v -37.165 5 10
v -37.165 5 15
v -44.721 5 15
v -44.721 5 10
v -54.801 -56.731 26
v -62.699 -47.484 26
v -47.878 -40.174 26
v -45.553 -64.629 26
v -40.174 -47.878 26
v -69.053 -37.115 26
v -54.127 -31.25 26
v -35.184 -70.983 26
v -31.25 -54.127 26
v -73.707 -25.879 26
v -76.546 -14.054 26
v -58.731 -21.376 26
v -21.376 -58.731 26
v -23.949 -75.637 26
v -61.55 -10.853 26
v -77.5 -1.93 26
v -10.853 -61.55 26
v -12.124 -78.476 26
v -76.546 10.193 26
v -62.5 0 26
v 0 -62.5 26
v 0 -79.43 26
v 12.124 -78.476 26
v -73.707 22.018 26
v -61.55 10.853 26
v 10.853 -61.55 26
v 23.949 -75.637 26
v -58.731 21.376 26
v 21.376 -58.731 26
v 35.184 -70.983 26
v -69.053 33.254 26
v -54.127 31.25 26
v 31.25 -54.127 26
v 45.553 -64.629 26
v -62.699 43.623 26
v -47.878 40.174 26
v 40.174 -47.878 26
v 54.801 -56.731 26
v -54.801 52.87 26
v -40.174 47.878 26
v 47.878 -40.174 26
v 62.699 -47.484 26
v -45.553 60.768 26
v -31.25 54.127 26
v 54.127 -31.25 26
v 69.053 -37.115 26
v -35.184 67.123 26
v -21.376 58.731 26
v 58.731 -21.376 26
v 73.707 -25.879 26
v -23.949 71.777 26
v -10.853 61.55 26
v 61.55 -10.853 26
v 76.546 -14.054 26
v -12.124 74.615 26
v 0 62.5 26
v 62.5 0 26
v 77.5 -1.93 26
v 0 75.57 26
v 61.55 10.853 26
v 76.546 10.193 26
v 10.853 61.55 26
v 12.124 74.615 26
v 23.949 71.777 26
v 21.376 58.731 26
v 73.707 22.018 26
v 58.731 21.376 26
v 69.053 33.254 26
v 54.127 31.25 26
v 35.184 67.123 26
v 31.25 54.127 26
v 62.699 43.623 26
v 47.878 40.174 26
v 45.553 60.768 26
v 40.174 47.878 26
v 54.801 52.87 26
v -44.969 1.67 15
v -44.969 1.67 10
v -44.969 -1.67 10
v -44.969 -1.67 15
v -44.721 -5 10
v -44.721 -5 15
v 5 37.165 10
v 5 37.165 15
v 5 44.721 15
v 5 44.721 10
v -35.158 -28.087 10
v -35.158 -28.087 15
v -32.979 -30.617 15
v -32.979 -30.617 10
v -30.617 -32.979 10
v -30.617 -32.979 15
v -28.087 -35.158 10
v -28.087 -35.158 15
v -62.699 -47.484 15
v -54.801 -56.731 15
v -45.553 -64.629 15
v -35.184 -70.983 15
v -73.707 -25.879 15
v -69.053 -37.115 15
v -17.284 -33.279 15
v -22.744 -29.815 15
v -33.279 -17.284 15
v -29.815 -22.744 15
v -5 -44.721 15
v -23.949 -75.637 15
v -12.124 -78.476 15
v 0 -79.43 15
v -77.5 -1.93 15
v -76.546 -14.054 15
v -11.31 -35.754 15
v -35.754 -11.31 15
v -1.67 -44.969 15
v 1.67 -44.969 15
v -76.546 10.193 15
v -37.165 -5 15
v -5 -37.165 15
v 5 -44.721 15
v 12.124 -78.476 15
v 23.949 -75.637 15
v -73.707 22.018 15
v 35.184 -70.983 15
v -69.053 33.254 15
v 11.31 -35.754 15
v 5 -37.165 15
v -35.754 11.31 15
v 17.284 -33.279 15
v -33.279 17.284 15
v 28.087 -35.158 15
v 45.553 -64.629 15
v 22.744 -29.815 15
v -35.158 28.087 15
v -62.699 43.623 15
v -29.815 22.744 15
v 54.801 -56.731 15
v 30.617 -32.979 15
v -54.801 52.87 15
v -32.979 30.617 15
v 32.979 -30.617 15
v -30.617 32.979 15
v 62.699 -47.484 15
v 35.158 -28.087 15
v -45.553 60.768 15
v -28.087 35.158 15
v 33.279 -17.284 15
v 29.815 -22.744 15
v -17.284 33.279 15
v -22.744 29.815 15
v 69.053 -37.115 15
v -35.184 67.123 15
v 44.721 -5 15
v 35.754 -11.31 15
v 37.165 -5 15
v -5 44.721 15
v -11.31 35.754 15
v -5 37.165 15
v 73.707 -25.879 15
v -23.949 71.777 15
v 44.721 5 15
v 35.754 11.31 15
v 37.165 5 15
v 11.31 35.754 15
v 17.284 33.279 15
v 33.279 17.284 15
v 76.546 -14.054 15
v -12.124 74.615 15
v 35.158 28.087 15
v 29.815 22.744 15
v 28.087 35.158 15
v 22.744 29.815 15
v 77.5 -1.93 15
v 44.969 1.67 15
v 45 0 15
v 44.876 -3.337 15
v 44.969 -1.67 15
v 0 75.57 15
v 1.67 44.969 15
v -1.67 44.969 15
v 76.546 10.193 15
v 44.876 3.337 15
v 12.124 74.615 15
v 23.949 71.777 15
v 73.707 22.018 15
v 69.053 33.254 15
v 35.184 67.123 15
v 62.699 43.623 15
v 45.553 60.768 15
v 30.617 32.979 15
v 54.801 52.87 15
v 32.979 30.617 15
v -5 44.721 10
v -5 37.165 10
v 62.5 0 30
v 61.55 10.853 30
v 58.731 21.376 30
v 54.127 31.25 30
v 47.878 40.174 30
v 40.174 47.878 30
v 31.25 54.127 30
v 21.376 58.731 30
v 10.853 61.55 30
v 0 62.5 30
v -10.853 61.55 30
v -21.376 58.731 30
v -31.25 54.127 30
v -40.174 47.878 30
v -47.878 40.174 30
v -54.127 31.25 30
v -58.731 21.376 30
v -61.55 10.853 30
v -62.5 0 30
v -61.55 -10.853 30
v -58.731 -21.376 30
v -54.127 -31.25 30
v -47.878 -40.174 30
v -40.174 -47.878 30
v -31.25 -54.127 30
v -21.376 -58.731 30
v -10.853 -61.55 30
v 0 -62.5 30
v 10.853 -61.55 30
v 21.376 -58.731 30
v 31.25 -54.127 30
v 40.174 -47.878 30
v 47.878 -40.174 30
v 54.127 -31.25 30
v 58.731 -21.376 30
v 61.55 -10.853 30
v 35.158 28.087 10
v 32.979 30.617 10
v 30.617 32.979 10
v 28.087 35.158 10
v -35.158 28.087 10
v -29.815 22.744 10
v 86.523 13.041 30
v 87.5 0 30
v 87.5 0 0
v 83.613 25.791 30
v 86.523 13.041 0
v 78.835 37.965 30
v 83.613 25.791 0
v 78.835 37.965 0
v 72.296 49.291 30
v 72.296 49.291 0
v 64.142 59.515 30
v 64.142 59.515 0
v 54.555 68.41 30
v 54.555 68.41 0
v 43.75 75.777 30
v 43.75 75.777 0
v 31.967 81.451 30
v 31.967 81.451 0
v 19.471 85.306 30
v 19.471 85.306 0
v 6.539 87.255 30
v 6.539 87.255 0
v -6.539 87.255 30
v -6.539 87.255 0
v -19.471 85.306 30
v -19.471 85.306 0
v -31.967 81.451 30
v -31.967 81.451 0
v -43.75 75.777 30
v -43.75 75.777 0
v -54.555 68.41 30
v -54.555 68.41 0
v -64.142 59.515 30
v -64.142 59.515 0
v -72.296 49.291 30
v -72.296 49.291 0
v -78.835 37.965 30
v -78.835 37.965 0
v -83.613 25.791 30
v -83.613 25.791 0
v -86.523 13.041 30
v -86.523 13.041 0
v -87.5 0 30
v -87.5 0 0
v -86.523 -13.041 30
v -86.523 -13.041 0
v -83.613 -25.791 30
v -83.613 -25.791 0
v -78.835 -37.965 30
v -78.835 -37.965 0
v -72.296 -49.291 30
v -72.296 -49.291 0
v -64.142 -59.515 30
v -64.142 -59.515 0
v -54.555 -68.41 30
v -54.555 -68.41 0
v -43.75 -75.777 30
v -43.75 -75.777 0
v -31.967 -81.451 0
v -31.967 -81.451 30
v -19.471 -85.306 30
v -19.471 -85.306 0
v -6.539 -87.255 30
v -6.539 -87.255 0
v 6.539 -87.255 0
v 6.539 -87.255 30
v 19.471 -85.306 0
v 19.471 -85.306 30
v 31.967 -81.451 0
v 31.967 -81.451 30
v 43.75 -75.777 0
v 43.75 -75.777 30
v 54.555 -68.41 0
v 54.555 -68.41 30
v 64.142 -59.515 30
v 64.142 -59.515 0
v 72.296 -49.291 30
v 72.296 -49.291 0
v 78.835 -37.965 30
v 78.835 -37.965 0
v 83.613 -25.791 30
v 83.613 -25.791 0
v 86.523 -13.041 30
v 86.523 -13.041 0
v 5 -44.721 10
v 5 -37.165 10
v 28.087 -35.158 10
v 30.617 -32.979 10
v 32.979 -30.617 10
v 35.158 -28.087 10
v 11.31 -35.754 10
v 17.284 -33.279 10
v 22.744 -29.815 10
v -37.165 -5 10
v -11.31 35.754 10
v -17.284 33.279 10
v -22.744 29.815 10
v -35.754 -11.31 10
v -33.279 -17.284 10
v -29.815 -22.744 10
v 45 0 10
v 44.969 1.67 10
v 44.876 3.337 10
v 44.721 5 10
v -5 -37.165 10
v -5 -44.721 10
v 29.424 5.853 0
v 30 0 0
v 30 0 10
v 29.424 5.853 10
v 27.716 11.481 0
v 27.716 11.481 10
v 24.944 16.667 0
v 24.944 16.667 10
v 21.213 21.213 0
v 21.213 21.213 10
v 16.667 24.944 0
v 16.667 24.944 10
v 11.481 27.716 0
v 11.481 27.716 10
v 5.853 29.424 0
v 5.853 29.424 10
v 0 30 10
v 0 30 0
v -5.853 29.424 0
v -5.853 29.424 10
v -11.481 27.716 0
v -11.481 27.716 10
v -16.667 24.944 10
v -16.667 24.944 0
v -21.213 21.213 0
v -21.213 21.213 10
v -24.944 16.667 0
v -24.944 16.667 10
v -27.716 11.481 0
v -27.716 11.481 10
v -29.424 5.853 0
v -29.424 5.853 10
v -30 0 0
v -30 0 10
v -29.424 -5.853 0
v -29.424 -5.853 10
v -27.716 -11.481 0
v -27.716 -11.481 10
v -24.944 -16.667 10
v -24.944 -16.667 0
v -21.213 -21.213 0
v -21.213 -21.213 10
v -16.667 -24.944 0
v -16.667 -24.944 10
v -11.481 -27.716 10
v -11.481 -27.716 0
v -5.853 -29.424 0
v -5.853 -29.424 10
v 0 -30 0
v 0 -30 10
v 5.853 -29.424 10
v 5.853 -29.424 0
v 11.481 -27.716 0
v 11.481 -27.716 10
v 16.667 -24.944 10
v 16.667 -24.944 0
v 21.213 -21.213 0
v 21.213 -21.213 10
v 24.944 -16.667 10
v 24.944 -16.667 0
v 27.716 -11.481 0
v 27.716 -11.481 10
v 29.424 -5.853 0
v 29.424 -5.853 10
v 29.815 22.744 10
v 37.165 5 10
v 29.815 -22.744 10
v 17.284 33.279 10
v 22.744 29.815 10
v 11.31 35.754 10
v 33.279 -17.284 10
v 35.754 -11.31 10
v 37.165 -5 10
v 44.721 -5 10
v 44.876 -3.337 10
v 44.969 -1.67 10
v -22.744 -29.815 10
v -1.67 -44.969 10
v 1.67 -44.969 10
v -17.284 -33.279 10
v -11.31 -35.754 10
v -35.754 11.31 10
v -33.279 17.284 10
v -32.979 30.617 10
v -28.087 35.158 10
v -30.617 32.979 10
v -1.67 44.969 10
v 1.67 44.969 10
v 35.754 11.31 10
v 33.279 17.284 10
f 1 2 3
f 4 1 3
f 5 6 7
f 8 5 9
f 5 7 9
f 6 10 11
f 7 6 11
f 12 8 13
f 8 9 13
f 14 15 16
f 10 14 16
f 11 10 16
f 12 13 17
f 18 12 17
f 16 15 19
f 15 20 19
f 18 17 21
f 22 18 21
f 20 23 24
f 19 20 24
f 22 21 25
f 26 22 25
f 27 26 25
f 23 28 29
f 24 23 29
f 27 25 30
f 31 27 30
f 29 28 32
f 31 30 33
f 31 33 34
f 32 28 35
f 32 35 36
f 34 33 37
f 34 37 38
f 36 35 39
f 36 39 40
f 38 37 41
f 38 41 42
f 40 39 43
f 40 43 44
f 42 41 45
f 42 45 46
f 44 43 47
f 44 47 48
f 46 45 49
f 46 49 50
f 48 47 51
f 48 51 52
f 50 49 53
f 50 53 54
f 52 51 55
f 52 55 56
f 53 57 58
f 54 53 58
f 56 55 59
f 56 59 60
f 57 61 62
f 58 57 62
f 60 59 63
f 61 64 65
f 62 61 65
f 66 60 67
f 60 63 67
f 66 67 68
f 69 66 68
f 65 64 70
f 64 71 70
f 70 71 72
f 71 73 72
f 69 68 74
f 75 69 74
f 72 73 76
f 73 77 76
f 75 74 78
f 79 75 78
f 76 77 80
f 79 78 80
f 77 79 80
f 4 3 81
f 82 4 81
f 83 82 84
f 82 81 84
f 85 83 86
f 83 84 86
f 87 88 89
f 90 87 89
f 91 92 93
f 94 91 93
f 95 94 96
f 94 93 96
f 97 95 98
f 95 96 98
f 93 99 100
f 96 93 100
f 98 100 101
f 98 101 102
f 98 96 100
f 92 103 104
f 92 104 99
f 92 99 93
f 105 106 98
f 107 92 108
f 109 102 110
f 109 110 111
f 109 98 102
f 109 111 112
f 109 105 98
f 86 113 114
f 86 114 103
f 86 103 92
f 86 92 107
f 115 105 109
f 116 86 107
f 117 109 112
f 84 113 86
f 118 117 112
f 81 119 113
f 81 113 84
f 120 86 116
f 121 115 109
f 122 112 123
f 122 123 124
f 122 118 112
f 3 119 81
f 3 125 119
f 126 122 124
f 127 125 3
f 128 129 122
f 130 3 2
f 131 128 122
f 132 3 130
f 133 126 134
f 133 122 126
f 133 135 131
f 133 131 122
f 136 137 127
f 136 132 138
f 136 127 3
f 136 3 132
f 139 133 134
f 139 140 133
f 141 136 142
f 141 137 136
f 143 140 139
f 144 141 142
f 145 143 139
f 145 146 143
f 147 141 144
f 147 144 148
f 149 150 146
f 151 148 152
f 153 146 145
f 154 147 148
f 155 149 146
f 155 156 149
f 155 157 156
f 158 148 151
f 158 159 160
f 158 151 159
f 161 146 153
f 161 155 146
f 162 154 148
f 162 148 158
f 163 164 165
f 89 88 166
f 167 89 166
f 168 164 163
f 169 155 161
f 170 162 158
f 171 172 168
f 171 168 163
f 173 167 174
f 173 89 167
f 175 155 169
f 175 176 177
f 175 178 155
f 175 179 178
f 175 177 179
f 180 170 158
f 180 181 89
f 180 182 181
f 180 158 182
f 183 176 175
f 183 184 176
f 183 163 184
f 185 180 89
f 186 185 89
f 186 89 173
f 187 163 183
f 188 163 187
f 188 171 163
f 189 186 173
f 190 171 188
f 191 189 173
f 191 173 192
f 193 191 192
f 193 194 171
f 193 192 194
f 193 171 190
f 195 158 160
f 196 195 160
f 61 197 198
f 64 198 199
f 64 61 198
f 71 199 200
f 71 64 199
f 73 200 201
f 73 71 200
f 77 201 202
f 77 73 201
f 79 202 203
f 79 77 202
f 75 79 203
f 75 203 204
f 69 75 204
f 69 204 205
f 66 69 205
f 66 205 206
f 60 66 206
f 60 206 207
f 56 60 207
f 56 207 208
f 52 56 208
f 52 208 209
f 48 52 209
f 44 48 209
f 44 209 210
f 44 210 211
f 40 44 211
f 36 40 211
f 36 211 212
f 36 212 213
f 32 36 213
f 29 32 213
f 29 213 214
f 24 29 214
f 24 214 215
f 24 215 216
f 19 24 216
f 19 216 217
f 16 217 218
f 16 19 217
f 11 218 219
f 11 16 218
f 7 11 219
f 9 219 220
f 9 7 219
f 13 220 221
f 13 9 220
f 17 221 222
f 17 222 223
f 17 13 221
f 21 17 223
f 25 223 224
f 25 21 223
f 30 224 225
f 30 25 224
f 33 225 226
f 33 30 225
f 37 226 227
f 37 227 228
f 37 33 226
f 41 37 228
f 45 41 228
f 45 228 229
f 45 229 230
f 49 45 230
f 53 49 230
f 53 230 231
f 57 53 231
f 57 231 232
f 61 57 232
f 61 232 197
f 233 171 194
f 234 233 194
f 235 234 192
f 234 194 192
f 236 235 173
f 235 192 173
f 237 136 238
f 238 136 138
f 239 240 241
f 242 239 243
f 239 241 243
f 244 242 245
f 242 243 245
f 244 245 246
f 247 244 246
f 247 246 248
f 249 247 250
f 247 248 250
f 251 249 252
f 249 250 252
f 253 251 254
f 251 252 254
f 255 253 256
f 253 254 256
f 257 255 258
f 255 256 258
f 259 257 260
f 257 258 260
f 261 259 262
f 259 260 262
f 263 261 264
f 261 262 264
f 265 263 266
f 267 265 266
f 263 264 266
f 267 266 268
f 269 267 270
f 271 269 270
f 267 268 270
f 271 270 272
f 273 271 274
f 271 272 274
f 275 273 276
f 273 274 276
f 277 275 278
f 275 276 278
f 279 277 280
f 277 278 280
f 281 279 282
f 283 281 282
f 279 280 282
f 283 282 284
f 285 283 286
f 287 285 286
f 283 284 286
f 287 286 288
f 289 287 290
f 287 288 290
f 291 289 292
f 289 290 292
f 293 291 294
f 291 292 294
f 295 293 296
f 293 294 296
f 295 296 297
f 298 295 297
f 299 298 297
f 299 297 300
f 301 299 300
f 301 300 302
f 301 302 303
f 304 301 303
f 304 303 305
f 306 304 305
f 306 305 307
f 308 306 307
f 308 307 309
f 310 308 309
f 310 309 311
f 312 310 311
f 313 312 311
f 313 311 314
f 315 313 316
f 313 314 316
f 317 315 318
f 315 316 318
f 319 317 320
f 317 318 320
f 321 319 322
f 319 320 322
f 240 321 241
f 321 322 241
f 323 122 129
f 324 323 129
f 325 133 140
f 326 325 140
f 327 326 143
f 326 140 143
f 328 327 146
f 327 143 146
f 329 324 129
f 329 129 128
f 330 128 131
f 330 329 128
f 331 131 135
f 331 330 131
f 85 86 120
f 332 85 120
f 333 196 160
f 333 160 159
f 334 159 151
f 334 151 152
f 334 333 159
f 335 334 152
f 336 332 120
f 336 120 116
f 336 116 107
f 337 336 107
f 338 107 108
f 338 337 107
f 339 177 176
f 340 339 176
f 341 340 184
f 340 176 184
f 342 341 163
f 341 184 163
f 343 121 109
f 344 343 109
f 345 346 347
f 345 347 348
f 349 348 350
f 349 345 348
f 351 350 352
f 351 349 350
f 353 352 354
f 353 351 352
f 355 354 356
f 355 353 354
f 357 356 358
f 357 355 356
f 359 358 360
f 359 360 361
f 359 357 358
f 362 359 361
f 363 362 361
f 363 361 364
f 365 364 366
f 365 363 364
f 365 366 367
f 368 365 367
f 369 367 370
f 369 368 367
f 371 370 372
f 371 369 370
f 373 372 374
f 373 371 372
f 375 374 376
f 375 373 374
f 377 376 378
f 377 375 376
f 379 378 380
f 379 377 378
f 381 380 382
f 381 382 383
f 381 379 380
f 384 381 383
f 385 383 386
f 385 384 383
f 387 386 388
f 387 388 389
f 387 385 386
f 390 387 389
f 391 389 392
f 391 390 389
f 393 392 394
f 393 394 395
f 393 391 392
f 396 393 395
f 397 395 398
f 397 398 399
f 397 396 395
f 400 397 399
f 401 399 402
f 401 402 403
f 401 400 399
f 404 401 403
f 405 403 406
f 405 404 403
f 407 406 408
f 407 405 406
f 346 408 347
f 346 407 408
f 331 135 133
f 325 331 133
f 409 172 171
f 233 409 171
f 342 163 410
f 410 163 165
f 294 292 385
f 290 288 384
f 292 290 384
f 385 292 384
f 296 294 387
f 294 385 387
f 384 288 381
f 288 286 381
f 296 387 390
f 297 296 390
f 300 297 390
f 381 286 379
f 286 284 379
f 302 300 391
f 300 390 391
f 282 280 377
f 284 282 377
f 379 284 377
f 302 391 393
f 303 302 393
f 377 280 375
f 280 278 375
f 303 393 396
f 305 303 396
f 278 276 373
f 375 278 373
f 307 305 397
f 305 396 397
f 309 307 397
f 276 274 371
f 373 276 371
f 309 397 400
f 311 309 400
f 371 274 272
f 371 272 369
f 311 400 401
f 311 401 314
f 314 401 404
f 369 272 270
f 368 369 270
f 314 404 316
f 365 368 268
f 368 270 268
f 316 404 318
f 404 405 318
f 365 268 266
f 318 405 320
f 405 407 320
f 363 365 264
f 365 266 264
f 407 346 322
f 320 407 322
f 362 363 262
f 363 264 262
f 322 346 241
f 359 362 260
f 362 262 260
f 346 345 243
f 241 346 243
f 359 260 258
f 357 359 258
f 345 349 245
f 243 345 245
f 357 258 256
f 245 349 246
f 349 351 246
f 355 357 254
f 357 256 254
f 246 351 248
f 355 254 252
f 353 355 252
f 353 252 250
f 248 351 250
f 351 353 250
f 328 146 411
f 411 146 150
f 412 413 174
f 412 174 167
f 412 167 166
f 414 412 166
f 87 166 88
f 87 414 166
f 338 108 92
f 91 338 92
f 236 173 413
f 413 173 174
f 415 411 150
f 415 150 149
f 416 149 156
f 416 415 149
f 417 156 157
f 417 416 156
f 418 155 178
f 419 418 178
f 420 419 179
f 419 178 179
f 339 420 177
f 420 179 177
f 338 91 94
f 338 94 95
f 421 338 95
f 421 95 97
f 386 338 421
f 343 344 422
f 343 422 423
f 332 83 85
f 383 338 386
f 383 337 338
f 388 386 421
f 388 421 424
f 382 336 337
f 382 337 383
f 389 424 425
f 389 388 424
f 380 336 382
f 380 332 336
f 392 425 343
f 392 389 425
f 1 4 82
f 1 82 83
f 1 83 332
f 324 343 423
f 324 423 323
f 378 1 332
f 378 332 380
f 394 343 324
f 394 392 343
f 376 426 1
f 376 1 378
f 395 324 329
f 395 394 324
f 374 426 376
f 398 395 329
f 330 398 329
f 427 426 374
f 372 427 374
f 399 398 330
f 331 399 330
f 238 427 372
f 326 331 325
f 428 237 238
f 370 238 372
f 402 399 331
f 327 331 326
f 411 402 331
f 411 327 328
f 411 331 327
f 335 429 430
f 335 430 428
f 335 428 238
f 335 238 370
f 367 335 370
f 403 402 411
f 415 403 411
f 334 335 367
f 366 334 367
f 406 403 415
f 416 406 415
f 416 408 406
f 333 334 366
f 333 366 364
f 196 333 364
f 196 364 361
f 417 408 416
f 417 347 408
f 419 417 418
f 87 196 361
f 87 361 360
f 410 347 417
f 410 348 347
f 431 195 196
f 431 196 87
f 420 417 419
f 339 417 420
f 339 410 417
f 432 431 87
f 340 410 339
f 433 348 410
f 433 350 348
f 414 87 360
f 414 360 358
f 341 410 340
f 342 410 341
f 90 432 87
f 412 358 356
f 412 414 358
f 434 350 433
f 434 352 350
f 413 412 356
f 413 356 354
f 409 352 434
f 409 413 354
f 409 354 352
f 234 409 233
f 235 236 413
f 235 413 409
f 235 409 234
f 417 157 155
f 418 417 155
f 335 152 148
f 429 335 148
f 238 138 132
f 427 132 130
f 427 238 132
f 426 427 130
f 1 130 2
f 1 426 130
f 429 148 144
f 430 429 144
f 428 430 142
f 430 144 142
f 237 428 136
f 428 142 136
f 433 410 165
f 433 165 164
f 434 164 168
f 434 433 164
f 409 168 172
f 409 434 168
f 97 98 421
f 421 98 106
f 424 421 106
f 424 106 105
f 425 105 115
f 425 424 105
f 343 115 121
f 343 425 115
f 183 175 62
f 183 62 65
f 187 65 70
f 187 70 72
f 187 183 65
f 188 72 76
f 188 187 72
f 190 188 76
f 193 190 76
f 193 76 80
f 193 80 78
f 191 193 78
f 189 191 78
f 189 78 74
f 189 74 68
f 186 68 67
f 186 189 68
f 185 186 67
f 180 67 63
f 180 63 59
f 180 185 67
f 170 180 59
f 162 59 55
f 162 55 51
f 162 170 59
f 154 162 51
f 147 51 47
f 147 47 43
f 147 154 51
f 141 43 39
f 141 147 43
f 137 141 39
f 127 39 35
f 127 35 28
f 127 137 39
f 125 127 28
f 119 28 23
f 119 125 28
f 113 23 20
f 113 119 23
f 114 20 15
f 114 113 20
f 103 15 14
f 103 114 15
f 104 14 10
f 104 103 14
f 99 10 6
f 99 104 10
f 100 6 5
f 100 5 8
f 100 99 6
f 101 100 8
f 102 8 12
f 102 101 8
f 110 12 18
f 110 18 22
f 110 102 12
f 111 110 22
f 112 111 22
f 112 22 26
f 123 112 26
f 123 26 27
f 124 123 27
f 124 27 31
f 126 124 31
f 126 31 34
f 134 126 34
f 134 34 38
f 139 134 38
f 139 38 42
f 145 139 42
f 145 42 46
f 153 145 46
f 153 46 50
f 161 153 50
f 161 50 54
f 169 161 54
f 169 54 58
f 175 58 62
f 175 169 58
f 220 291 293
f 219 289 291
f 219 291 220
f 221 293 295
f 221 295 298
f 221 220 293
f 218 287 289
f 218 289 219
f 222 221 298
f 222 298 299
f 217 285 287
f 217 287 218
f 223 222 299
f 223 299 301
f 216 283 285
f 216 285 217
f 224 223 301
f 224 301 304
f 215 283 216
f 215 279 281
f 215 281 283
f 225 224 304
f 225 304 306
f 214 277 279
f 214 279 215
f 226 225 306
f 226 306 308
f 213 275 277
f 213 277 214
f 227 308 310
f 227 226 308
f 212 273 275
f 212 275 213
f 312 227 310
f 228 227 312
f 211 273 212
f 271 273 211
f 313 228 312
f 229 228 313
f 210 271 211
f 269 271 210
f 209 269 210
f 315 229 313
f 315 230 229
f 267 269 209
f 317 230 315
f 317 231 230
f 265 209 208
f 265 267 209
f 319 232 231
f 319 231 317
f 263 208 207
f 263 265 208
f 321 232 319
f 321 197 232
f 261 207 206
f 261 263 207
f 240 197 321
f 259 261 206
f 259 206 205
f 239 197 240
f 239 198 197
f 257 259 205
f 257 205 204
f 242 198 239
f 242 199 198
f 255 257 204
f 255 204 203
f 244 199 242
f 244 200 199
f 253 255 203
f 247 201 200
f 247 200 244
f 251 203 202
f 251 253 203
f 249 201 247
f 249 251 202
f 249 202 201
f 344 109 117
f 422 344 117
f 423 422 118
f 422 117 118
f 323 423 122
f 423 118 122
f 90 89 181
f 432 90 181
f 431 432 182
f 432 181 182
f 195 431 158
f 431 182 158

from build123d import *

# Parameters (mm, degrees)
F0_R     = 87.5
F0_R_2   = 30
F1_DEPTH = 10
F2_R     = 87.5
F2_R_2   = 37.5
F3_DEPTH = 5
F5_DEPTH = 5
F6_R     = 87.5
F6_R_2   = 62.5
F7_DEPTH = 15
F8_R     = 77.5
F9_DEPTH = 11


with BuildPart() as f1:
    # F0 (on Top) → F1 (new body)
    with BuildSketch(Plane.XY):
        Circle(F0_R)
        Circle(F0_R_2, mode=Mode.SUBTRACT)
    extrude(amount=F1_DEPTH)

    # F2 (on face) → F3 (join)
    with BuildSketch(Plane.XY.offset(10)):
        Circle(F2_R)
        Circle(F2_R_2, mode=Mode.SUBTRACT)
    extrude(amount=F3_DEPTH)

    # F4 (on face) → F5 (cut)
    with BuildSketch(Plane.XY.offset(15)):
        with BuildLine():
            ThreePointArc((-29.815278958, 22.7442111461), (-26.5165042945, 26.5165042945), (-22.7442111461, 29.815278958))
            Line((-22.7442111461, 29.815278958), (-28.0872426958, 35.1583105076))
            ThreePointArc((-28.0872426958, 35.1583105076), (-31.8198051534, 31.8198051534), (-35.1583105076, 28.0872426958))
            Line((-35.1583105076, 28.0872426958), (-29.815278958, 22.7442111461))
        make_face()
        with BuildLine():
            Line((-5, 44.72135955), (-5, 37.1651718683))
            ThreePointArc((-5, 37.1651718683), (0, 37.5), (5, 37.1651718683))
            Line((5, 37.1651718683), (5, 44.72135955))
            ThreePointArc((5, 44.72135955), (0, 45), (-5, 44.72135955))
        make_face()
        with BuildLine():
            Line((28.0872426958, 35.1583105076), (22.7442111461, 29.815278958))
            ThreePointArc((22.7442111461, 29.815278958), (26.5165042945, 26.5165042945), (29.815278958, 22.7442111461))
            Line((29.815278958, 22.7442111461), (35.1583105076, 28.0872426958))
            ThreePointArc((35.1583105076, 28.0872426958), (31.8198051534, 31.8198051534), (28.0872426958, 35.1583105076))
        make_face()
        with BuildLine():
            Line((44.72135955, 5), (37.1651718683, 5))
            ThreePointArc((37.1651718683, 5), (37.4161993331, 2.5055992236), (37.5, 0))
            ThreePointArc((37.5, 0), (37.4161993331, -2.5055992236), (37.1651718683, -5))
            Line((37.1651718683, -5), (44.72135955, -5))
            ThreePointArc((44.72135955, -5), (44.9302858869, -2.5038790157), (45, 0))
            ThreePointArc((45, 0), (44.9302858869, 2.5038790157), (44.72135955, 5))
        make_face()
        with BuildLine():
            Line((35.1583105076, -28.0872426958), (29.815278958, -22.7442111461))
            ThreePointArc((29.815278958, -22.7442111461), (26.5165042945, -26.5165042945), (22.7442111461, -29.815278958))
            Line((22.7442111461, -29.815278958), (28.0872426958, -35.1583105076))
            ThreePointArc((28.0872426958, -35.1583105076), (31.8198051534, -31.8198051534), (35.1583105076, -28.0872426958))
        make_face()
        with BuildLine():
            ThreePointArc((5, -37.1651718683), (0, -37.5), (-5, -37.1651718683))
            Line((-5, -37.1651718683), (-5, -44.72135955))
            ThreePointArc((-5, -44.72135955), (0, -45), (5, -44.72135955))
            Line((5, -44.72135955), (5, -37.1651718683))
        make_face()
        with BuildLine():
            ThreePointArc((-22.7442111461, -29.815278958), (-26.5165042945, -26.5165042945), (-29.815278958, -22.7442111461))
            Line((-29.815278958, -22.7442111461), (-35.1583105076, -28.0872426958))
            ThreePointArc((-35.1583105076, -28.0872426958), (-31.8198051534, -31.8198051534), (-28.0872426958, -35.1583105076))
            Line((-28.0872426958, -35.1583105076), (-22.7442111461, -29.815278958))
        make_face()
        with BuildLine():
            ThreePointArc((-37.1651718683, -5), (-37.5, 0), (-37.1651718683, 5))
            Line((-37.1651718683, 5), (-44.72135955, 5))
            ThreePointArc((-44.72135955, 5), (-45, 0), (-44.72135955, -5))
            Line((-44.72135955, -5), (-37.1651718683, -5))
        make_face()
    extrude(amount=-F5_DEPTH, mode=Mode.SUBTRACT)

    # F6 (on face) → F7 (join)
    with BuildSketch(Plane.XY.offset(15)):
        Circle(F6_R)
        Circle(F6_R_2, mode=Mode.SUBTRACT)
    extrude(amount=F7_DEPTH)

    # F8 (on face) → F9 (cut)
    with BuildSketch(Plane.XY.offset(15)):
        with Locations((0, -1.9303644706)):
            Circle(F8_R)
    extrude(amount=F9_DEPTH, mode=Mode.SUBTRACT)


solid = f1.part
